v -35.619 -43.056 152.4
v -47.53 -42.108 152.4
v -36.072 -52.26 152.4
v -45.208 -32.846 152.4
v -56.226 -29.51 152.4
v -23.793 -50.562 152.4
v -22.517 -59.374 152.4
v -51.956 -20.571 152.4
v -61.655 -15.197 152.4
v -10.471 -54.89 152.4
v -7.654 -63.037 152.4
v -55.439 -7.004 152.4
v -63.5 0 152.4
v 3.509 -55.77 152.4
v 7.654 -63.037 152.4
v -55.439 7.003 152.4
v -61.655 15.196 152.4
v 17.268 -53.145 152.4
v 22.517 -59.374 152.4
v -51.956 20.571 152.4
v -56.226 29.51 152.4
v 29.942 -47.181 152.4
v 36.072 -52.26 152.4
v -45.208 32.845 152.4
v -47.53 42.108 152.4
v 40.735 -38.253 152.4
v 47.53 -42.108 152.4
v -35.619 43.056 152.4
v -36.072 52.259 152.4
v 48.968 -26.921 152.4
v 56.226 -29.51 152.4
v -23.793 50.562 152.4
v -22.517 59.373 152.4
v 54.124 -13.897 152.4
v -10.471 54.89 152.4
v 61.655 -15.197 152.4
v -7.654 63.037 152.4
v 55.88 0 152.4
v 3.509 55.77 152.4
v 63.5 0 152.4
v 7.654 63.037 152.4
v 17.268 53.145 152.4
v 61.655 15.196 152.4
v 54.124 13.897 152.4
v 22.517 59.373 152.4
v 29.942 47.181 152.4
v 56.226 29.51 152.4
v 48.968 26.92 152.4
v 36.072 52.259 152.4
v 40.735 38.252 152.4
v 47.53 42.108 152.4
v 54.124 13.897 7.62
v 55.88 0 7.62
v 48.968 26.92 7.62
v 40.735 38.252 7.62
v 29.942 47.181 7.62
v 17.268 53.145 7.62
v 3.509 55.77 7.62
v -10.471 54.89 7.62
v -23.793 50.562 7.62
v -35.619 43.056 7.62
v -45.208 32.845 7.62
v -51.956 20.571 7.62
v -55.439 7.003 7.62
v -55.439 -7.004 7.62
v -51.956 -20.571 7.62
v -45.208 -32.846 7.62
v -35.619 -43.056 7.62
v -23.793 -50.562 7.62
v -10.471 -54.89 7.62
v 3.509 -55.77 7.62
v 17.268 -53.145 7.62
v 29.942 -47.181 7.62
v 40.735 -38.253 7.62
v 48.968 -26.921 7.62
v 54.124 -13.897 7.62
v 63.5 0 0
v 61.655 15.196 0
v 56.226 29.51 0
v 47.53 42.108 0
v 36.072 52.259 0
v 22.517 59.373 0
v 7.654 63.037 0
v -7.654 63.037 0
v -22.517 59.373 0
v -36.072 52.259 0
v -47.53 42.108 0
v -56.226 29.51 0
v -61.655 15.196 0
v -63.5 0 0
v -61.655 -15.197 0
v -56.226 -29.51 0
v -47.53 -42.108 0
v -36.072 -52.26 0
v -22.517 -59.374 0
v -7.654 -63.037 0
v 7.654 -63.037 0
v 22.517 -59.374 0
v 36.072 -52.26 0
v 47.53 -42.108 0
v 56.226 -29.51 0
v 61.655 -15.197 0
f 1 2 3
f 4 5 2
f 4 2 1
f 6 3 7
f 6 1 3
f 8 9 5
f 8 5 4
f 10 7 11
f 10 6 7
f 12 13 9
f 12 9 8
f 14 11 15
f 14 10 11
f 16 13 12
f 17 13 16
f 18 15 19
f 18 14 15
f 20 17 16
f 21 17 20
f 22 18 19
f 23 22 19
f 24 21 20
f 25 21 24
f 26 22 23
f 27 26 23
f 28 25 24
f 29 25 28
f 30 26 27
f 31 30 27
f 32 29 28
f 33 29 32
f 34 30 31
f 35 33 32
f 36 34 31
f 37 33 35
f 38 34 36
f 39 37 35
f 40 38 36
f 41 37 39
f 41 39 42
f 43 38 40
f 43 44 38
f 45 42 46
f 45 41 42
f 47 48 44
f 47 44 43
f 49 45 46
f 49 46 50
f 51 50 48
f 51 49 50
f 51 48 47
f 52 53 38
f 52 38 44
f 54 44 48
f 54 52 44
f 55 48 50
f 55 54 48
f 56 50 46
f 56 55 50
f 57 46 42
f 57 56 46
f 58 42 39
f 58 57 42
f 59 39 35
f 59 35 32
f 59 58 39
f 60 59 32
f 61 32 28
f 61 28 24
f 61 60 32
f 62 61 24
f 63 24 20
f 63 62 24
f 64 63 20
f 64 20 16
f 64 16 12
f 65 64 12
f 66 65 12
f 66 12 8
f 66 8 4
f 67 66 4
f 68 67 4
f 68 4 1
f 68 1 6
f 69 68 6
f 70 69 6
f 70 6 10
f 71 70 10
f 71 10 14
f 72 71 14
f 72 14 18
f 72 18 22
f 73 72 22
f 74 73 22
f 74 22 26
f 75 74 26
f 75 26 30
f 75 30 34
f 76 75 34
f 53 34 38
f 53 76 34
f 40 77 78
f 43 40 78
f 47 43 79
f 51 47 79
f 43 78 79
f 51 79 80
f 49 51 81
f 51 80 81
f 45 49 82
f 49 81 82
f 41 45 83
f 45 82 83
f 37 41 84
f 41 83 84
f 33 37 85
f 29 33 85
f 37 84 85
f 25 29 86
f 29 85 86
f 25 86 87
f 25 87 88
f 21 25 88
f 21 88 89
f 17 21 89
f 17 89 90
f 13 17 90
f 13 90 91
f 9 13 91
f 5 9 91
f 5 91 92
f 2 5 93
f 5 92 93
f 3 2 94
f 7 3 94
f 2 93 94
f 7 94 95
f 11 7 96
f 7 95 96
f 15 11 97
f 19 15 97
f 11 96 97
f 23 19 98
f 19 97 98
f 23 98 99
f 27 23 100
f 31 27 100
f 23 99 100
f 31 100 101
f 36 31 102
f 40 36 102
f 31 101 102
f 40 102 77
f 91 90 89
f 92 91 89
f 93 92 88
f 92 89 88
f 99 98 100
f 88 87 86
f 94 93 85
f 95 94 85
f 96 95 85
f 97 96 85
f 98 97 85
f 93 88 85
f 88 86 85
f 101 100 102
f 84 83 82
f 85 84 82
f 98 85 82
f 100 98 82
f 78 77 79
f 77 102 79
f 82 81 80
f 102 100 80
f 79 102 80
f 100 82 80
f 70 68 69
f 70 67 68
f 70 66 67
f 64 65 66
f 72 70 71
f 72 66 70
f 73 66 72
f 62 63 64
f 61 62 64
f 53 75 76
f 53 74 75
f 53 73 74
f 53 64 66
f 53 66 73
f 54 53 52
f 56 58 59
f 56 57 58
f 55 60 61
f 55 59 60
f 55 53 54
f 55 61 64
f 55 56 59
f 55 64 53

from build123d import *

# Parameters (mm, degrees)
F0_R     = 63.5
F1_DEPTH = 152.4
F3_T     = -7.62


with BuildPart() as f1:
    # F0 (on Top) → F1 (new body)
    with BuildSketch(Plane.XY):
        with Locations((-8.565548, 9.538906)):
            Circle(F0_R)
    extrude(amount=F1_DEPTH)


with BuildPart() as f1_1:
    # F2: moved
    add(f1.part.moved(Location((8.56556, -9.53905, 0))))

    # F3
    f3_openings = [f1_1.faces().sort_by_distance(p)[0] for p in [
        (1.2e-05, -0.000144, 152.4),
    ]]
    offset(amount=F3_T, openings=f3_openings)


solid = f1_1.part
